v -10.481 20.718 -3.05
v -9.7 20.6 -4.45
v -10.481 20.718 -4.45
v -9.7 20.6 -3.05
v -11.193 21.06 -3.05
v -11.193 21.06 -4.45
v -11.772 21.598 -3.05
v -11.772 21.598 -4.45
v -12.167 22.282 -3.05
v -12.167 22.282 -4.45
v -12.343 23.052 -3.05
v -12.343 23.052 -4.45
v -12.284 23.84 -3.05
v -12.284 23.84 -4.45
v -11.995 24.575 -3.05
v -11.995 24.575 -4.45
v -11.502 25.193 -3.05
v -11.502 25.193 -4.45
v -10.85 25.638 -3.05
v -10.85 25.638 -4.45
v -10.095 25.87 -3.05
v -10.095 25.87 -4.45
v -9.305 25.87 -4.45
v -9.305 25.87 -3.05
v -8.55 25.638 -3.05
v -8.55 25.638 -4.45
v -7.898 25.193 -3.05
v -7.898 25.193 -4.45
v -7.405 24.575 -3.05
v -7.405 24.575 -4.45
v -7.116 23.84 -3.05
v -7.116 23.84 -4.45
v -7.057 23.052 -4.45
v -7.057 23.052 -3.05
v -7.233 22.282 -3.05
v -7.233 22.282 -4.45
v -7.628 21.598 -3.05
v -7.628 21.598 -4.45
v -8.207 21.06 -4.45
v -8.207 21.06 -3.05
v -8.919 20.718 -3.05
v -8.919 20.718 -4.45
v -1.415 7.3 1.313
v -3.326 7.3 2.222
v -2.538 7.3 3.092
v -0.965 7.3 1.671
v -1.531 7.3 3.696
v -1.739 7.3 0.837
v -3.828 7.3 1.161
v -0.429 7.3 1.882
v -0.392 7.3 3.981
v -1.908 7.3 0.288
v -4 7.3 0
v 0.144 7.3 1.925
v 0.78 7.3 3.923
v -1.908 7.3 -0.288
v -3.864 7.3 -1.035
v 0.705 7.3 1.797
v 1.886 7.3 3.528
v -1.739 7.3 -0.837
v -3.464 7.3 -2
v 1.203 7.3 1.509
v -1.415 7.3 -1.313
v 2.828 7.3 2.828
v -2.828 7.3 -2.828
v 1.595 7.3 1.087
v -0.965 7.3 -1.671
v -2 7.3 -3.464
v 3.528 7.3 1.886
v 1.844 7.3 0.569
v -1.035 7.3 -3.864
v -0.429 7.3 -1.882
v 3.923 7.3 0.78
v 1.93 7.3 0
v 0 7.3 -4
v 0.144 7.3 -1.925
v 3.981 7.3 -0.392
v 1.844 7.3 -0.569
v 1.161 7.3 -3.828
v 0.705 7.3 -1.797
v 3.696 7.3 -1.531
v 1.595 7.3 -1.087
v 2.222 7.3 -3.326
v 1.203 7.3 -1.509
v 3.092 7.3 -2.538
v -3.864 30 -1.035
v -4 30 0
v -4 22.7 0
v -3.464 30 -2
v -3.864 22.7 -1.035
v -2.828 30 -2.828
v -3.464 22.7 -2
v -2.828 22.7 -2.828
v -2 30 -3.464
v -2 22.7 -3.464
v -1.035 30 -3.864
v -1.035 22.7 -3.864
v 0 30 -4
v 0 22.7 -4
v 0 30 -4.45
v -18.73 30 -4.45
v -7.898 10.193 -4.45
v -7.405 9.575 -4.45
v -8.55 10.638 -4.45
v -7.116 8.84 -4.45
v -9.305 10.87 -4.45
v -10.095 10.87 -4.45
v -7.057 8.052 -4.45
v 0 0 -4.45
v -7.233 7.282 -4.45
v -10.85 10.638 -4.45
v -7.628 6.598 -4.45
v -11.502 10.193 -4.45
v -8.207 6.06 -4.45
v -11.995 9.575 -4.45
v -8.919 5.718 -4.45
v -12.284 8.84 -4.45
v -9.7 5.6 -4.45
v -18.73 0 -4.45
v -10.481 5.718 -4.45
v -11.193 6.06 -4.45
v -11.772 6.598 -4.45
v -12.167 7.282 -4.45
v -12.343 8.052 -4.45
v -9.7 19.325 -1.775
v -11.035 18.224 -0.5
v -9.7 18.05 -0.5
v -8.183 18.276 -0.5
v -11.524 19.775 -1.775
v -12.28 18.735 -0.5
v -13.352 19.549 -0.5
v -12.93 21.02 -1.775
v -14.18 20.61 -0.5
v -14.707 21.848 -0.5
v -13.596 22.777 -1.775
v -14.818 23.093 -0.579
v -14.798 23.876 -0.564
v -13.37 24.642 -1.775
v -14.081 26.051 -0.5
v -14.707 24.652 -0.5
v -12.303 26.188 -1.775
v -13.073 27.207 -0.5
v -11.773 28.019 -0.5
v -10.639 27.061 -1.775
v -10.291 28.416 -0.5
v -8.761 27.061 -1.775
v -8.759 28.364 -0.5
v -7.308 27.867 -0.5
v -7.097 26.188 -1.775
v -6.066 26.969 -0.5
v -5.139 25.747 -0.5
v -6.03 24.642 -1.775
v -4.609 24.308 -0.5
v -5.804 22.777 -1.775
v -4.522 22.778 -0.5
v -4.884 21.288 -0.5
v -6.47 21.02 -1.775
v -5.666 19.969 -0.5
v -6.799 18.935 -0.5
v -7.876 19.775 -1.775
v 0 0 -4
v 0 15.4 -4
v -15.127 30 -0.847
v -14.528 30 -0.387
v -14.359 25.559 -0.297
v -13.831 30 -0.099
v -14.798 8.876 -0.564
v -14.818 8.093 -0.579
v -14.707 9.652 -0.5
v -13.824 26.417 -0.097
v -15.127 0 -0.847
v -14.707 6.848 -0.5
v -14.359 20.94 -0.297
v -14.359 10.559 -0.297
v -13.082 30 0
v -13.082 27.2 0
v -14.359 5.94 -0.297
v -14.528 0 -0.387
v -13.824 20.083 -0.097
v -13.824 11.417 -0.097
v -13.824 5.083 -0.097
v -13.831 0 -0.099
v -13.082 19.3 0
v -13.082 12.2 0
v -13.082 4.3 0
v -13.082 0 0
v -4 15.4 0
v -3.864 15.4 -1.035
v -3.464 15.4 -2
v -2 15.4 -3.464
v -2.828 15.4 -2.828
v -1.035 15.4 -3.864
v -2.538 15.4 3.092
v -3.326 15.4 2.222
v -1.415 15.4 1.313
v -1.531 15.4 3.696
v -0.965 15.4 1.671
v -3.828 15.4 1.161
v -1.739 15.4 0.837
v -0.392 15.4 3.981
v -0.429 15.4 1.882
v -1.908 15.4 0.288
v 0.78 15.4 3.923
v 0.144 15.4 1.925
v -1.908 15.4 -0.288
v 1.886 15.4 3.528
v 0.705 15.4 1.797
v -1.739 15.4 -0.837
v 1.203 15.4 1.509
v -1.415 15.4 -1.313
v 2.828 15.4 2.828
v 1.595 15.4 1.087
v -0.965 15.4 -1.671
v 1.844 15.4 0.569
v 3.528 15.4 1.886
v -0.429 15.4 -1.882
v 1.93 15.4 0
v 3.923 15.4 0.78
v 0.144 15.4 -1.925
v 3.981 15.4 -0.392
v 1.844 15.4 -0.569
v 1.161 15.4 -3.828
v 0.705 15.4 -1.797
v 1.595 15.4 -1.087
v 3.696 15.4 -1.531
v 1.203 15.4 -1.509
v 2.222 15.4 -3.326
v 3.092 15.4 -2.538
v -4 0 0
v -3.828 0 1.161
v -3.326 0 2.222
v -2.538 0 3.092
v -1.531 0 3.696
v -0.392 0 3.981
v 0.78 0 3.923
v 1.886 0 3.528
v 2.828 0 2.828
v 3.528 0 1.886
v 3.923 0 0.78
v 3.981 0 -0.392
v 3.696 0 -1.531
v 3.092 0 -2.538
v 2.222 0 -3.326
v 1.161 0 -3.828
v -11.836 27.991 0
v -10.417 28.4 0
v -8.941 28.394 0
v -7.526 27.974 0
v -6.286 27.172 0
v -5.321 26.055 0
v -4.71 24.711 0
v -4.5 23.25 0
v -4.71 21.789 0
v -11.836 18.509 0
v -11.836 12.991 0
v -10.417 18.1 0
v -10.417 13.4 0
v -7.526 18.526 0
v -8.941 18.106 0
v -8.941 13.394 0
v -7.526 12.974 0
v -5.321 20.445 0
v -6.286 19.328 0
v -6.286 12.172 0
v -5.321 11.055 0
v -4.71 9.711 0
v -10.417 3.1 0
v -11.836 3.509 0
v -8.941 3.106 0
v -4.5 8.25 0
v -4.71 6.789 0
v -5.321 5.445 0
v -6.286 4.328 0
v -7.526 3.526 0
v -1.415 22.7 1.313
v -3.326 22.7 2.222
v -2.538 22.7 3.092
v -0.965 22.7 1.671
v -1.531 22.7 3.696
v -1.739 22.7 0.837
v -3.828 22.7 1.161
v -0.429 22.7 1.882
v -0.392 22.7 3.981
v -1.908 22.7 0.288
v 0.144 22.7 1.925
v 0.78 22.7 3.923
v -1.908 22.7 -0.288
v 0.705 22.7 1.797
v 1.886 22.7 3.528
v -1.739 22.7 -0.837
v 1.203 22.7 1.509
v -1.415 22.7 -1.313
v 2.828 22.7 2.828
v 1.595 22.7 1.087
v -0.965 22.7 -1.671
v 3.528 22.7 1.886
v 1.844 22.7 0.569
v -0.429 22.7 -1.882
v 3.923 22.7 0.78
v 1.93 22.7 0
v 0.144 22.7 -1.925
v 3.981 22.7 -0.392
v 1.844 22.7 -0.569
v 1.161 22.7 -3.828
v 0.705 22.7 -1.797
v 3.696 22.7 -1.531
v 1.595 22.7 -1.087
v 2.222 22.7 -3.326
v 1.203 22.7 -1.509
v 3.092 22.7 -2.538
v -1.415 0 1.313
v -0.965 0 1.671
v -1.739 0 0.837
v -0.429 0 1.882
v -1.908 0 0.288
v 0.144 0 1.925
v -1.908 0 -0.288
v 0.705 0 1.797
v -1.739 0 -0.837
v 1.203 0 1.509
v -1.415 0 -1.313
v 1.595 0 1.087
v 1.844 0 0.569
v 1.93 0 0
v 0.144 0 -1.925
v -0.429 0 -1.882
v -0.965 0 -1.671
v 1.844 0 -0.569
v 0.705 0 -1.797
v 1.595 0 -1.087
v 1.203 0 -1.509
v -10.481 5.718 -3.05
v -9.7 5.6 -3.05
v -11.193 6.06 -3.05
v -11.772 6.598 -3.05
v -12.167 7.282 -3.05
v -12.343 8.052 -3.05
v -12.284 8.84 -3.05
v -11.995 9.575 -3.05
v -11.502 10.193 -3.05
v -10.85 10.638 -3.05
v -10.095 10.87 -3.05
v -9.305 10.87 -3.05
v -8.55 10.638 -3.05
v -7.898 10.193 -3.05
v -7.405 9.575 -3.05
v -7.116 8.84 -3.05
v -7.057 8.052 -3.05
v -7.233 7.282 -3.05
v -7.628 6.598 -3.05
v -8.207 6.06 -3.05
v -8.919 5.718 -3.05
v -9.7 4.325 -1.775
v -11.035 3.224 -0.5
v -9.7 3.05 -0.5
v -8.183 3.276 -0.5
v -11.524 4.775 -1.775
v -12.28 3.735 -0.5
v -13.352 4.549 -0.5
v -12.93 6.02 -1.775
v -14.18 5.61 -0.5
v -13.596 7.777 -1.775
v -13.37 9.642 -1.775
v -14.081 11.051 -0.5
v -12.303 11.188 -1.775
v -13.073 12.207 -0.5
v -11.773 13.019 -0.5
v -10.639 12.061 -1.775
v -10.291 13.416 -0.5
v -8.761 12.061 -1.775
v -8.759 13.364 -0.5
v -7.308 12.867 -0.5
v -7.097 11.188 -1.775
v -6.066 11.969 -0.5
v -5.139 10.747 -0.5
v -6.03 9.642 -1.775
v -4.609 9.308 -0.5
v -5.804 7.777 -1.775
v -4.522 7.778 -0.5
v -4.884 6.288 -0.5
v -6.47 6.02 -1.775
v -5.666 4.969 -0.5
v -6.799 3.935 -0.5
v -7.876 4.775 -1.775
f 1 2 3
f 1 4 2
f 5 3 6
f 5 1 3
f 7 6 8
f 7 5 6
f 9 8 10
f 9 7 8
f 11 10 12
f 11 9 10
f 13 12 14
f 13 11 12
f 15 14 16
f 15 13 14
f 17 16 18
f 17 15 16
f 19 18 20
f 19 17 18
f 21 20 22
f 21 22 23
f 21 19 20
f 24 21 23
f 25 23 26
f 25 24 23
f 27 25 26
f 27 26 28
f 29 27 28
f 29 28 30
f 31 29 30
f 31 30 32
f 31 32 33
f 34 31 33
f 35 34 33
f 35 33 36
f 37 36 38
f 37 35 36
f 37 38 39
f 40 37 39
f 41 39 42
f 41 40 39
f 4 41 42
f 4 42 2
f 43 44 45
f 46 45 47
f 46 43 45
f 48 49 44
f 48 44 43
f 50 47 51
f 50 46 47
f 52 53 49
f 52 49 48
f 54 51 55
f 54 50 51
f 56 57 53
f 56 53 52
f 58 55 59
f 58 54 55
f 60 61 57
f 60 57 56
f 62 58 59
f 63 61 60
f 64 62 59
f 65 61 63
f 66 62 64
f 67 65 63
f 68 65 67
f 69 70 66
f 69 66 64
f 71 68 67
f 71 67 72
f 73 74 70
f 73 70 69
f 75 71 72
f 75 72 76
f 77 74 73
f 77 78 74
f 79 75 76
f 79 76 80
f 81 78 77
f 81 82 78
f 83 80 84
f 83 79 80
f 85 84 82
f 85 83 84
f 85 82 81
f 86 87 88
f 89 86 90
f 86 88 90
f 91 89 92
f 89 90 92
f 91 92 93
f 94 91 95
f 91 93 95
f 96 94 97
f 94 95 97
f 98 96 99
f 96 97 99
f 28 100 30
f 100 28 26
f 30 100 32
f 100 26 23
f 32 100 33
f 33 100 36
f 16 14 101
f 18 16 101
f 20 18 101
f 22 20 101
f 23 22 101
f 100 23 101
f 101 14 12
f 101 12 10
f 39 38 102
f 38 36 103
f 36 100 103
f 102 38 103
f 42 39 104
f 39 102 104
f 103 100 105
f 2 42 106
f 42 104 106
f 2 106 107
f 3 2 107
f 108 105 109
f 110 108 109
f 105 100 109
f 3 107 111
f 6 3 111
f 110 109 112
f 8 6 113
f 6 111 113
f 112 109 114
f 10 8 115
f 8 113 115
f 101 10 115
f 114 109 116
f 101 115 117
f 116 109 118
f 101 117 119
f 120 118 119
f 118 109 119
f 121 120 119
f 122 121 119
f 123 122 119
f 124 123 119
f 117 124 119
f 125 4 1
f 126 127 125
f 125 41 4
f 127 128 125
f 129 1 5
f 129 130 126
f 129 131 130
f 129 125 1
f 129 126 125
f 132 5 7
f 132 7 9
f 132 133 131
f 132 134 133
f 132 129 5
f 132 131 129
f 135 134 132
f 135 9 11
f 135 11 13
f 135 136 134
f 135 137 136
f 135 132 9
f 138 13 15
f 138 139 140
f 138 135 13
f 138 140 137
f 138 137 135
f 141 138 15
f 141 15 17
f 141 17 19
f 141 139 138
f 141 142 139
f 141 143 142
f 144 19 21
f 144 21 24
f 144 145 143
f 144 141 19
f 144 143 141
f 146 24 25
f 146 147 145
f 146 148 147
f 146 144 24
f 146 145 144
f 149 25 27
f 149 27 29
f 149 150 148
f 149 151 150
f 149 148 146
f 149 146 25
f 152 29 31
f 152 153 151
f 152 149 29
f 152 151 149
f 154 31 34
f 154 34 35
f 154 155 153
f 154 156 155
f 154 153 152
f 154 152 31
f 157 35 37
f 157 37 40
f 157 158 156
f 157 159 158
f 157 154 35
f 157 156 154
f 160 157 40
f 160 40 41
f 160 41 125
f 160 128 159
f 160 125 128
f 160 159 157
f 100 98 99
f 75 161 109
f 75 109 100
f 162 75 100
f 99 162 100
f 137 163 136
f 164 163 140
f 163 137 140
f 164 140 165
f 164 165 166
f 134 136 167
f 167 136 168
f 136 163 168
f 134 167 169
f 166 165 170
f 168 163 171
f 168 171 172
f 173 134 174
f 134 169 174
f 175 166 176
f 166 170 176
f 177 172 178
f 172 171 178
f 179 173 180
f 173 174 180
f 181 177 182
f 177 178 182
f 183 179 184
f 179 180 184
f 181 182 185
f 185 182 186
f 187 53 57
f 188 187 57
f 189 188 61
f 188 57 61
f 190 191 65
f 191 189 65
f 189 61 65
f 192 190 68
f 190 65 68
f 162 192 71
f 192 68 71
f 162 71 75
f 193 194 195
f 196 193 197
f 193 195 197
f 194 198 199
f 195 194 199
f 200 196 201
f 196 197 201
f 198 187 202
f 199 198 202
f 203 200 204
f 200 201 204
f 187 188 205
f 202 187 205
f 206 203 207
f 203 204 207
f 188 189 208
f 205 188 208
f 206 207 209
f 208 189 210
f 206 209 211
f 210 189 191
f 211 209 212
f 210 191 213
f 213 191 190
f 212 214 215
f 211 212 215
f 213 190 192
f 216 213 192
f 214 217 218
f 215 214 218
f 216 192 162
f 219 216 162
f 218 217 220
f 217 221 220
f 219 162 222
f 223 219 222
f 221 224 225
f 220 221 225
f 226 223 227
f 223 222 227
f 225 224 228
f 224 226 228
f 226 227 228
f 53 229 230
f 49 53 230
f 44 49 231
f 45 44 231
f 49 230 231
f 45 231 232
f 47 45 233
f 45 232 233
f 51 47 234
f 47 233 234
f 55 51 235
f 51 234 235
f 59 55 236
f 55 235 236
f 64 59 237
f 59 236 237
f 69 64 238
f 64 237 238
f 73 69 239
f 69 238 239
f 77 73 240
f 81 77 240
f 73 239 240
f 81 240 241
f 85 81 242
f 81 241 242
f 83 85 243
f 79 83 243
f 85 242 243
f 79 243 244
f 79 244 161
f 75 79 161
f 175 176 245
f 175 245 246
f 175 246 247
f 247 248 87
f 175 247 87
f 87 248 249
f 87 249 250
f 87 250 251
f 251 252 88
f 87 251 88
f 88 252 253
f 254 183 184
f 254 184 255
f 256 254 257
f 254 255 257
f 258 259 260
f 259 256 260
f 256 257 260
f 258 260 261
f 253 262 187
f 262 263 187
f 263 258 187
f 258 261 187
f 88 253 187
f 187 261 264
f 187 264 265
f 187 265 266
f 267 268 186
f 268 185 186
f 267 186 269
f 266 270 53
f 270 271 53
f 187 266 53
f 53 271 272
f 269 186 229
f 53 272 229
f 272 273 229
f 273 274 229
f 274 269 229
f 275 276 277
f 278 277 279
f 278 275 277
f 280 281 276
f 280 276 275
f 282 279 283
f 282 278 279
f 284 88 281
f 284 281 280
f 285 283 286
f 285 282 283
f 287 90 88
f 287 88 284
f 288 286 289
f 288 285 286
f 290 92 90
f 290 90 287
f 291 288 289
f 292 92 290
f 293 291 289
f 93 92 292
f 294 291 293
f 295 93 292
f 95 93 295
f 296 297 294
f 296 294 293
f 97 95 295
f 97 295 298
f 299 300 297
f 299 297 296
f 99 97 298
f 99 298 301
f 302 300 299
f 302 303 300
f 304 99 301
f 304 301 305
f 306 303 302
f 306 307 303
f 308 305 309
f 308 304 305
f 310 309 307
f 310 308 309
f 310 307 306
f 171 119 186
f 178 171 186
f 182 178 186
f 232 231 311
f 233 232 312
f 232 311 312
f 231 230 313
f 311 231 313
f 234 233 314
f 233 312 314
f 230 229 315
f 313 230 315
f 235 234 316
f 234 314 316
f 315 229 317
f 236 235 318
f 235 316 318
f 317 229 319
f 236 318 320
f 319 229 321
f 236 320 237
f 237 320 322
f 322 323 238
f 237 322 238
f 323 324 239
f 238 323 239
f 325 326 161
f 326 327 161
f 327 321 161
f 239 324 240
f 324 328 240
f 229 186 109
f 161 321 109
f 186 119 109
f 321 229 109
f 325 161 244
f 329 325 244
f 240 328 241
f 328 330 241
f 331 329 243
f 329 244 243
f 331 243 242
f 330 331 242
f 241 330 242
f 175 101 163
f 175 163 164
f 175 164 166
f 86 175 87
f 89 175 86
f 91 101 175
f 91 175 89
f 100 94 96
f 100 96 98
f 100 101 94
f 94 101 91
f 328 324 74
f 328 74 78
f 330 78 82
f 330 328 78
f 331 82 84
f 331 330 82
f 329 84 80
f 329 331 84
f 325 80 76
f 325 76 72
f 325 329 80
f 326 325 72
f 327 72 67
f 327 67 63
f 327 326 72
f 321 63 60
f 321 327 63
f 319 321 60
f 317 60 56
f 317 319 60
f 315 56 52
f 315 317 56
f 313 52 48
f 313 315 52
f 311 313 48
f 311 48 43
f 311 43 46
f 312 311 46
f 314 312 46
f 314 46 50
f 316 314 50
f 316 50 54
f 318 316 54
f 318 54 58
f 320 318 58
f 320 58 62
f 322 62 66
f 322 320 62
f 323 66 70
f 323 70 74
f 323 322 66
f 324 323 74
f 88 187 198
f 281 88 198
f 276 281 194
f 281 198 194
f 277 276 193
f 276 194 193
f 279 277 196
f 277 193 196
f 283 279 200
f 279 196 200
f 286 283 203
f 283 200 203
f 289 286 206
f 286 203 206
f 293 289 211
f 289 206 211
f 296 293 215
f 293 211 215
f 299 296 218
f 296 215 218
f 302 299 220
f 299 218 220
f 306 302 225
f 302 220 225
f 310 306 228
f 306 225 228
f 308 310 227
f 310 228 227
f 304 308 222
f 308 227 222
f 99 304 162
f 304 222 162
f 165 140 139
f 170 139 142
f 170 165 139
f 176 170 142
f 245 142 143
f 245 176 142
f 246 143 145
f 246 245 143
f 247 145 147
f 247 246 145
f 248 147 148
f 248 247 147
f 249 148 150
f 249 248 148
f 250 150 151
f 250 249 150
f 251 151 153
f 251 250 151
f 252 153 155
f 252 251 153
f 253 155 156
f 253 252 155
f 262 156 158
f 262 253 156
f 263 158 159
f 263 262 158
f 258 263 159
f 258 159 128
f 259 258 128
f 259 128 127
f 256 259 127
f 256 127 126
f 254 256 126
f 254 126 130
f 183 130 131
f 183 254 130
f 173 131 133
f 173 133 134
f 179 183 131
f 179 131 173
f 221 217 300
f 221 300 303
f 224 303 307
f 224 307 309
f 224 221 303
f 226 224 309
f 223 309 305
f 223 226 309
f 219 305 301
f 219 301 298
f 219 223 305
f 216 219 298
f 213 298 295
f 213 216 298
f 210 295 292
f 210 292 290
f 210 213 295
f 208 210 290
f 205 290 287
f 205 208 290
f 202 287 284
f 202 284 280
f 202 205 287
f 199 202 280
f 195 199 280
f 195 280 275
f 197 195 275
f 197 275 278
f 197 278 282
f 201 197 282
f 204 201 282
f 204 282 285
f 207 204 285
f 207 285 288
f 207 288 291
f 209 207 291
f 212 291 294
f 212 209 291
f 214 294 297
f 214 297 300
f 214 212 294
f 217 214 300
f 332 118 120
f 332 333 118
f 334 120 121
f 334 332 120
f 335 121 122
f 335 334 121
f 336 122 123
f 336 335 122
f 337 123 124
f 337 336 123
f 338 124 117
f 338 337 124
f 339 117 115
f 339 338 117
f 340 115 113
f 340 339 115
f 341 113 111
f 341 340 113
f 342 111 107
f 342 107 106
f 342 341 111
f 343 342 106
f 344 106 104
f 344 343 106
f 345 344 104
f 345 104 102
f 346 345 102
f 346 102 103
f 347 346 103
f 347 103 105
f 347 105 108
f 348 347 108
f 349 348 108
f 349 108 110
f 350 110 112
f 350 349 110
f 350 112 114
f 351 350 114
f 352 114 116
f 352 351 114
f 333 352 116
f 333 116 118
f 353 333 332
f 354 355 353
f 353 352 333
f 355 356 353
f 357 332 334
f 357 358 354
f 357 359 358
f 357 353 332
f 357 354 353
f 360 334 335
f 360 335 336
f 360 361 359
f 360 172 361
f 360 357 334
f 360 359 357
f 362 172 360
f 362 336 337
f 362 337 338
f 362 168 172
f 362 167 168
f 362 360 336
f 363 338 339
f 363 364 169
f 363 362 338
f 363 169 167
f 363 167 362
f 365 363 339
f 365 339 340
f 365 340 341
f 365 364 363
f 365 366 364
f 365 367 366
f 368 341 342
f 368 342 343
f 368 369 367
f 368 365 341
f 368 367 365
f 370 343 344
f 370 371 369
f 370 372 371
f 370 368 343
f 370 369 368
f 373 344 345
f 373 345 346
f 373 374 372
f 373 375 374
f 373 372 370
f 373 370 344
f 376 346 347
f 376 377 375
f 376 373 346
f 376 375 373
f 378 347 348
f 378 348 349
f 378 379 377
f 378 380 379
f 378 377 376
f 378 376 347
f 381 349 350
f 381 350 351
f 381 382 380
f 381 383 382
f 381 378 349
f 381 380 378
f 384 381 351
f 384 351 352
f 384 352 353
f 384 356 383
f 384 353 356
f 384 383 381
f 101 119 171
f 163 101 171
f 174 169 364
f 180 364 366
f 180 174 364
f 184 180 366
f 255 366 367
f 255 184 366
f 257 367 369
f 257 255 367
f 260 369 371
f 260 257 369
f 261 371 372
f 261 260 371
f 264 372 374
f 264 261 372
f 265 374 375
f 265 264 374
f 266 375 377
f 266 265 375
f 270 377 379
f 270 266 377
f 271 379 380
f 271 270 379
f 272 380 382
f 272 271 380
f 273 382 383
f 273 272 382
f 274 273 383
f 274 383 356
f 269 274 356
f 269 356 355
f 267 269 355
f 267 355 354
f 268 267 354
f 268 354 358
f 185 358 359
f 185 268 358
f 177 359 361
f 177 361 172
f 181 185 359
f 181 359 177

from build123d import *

# Parameters (mm, degrees)
SKETCH1_R                                    = 1.93
BOSS_EXTRUDE1_DEPTH                          = 7.3
BOSS_EXTRUDE2_DEPTH                          = 30
BOSS_EXTRUDE5_START                          = 15.4
SKETCH1_7_R                                  = 1.93
BOSS_EXTRUDE5_DEPTH                          = 7.3
CSK_FOR_M5_COUNTERSUNK_FLAT_HEAD_SCR_2_COUNT = 2
CSK_FOR_M5_COUNTERSUNK_FLAT_HEAD_SCR_2_PITCH = 15


with BuildPart() as part:
    # Sketch1 → Boss-Extrude1 (new body)
    with BuildSketch(Plane(origin=(0, 0, 0), x_dir=(1, 0, 0), z_dir=(0, 1, 0))):
        with BuildLine():
            Line((0, 4), (0, 4.45))
            Line((0, 4.45), (-18.73, 4.45))
            Line((-18.73, 4.45), (-15.127118856, 0.847118856))
            ThreePointArc((-15.127118856, 0.847118856), (-14.188807149, 0.220159018), (-13.081993025, 0))
            Line((-13.081993025, 0), (-4, 0))
            ThreePointArc((-4, 0), (2.828427125, -2.828427125), (0, 4))
        make_face()
        Circle(SKETCH1_R, mode=Mode.SUBTRACT)
    extrude(amount=BOSS_EXTRUDE1_DEPTH)

    # Sketch1<3> → Boss-Extrude2 (add)
    with BuildSketch(Plane(origin=(0, 0, 0), x_dir=(1, 0, 0), z_dir=(0, 1, 0))):
        with BuildLine():
            Line((0, 4), (0, 4.45))
            Line((0, 4.45), (-18.73, 4.45))
            Line((-18.73, 4.45), (-15.127118856, 0.847118856))
            ThreePointArc((-15.127118856, 0.847118856), (-14.188807149, 0.220159018), (-13.081993025, 0))
            Line((-13.081993025, 0), (-4, 0))
            ThreePointArc((-4, 0), (-2.828427125, 2.828427125), (0, 4))
        make_face()
    extrude(amount=BOSS_EXTRUDE2_DEPTH)

    # Sketch1<7> → Boss-Extrude5 (add)
    with BuildSketch(Plane(origin=(0, 0, 0), x_dir=(1, 0, 0), z_dir=(0, 1, 0)).offset(BOSS_EXTRUDE5_START)):
        with BuildLine():
            ThreePointArc((4, 0), (2.828427125, 2.828427125), (0, 4))
            ThreePointArc((0, 4), (-2.828427125, 2.828427125), (-4, 0))
            ThreePointArc((-4, 0), (0, -4), (4, 0))
        make_face()
        Circle(SKETCH1_7_R, mode=Mode.SUBTRACT)
    extrude(amount=BOSS_EXTRUDE5_DEPTH)

    # Sketch3 → CSK for M5 Countersunk Flat Head Screw1 (revolve, cut)
    with BuildSketch(Plane(origin=(-9.7, 23.25, 0), x_dir=(0, -1, 0), z_dir=(1, 0, 0))):
        Polygon((0, 0), (0, 4.45), (2.65, 4.45), (2.65, 3.05), (5.2, 0.5), (5.2, 0), align=None)
    csk_for_m5_countersunk_flat_head_screw1 = revolve(axis=Axis((-9.7, 23.25, 6.35), (0, 0, -1)), mode=Mode.SUBTRACT)

    # CSK for M5 Countersunk Flat Head Scr 2: CSK for M5 Countersunk Flat Head Screw1 ×2
    with Locations(*[(0, -i * CSK_FOR_M5_COUNTERSUNK_FLAT_HEAD_SCR_2_PITCH, 0) for i in range(1, CSK_FOR_M5_COUNTERSUNK_FLAT_HEAD_SCR_2_COUNT)]):
        add(csk_for_m5_countersunk_flat_head_screw1, mode=Mode.SUBTRACT)


solid = part.part
